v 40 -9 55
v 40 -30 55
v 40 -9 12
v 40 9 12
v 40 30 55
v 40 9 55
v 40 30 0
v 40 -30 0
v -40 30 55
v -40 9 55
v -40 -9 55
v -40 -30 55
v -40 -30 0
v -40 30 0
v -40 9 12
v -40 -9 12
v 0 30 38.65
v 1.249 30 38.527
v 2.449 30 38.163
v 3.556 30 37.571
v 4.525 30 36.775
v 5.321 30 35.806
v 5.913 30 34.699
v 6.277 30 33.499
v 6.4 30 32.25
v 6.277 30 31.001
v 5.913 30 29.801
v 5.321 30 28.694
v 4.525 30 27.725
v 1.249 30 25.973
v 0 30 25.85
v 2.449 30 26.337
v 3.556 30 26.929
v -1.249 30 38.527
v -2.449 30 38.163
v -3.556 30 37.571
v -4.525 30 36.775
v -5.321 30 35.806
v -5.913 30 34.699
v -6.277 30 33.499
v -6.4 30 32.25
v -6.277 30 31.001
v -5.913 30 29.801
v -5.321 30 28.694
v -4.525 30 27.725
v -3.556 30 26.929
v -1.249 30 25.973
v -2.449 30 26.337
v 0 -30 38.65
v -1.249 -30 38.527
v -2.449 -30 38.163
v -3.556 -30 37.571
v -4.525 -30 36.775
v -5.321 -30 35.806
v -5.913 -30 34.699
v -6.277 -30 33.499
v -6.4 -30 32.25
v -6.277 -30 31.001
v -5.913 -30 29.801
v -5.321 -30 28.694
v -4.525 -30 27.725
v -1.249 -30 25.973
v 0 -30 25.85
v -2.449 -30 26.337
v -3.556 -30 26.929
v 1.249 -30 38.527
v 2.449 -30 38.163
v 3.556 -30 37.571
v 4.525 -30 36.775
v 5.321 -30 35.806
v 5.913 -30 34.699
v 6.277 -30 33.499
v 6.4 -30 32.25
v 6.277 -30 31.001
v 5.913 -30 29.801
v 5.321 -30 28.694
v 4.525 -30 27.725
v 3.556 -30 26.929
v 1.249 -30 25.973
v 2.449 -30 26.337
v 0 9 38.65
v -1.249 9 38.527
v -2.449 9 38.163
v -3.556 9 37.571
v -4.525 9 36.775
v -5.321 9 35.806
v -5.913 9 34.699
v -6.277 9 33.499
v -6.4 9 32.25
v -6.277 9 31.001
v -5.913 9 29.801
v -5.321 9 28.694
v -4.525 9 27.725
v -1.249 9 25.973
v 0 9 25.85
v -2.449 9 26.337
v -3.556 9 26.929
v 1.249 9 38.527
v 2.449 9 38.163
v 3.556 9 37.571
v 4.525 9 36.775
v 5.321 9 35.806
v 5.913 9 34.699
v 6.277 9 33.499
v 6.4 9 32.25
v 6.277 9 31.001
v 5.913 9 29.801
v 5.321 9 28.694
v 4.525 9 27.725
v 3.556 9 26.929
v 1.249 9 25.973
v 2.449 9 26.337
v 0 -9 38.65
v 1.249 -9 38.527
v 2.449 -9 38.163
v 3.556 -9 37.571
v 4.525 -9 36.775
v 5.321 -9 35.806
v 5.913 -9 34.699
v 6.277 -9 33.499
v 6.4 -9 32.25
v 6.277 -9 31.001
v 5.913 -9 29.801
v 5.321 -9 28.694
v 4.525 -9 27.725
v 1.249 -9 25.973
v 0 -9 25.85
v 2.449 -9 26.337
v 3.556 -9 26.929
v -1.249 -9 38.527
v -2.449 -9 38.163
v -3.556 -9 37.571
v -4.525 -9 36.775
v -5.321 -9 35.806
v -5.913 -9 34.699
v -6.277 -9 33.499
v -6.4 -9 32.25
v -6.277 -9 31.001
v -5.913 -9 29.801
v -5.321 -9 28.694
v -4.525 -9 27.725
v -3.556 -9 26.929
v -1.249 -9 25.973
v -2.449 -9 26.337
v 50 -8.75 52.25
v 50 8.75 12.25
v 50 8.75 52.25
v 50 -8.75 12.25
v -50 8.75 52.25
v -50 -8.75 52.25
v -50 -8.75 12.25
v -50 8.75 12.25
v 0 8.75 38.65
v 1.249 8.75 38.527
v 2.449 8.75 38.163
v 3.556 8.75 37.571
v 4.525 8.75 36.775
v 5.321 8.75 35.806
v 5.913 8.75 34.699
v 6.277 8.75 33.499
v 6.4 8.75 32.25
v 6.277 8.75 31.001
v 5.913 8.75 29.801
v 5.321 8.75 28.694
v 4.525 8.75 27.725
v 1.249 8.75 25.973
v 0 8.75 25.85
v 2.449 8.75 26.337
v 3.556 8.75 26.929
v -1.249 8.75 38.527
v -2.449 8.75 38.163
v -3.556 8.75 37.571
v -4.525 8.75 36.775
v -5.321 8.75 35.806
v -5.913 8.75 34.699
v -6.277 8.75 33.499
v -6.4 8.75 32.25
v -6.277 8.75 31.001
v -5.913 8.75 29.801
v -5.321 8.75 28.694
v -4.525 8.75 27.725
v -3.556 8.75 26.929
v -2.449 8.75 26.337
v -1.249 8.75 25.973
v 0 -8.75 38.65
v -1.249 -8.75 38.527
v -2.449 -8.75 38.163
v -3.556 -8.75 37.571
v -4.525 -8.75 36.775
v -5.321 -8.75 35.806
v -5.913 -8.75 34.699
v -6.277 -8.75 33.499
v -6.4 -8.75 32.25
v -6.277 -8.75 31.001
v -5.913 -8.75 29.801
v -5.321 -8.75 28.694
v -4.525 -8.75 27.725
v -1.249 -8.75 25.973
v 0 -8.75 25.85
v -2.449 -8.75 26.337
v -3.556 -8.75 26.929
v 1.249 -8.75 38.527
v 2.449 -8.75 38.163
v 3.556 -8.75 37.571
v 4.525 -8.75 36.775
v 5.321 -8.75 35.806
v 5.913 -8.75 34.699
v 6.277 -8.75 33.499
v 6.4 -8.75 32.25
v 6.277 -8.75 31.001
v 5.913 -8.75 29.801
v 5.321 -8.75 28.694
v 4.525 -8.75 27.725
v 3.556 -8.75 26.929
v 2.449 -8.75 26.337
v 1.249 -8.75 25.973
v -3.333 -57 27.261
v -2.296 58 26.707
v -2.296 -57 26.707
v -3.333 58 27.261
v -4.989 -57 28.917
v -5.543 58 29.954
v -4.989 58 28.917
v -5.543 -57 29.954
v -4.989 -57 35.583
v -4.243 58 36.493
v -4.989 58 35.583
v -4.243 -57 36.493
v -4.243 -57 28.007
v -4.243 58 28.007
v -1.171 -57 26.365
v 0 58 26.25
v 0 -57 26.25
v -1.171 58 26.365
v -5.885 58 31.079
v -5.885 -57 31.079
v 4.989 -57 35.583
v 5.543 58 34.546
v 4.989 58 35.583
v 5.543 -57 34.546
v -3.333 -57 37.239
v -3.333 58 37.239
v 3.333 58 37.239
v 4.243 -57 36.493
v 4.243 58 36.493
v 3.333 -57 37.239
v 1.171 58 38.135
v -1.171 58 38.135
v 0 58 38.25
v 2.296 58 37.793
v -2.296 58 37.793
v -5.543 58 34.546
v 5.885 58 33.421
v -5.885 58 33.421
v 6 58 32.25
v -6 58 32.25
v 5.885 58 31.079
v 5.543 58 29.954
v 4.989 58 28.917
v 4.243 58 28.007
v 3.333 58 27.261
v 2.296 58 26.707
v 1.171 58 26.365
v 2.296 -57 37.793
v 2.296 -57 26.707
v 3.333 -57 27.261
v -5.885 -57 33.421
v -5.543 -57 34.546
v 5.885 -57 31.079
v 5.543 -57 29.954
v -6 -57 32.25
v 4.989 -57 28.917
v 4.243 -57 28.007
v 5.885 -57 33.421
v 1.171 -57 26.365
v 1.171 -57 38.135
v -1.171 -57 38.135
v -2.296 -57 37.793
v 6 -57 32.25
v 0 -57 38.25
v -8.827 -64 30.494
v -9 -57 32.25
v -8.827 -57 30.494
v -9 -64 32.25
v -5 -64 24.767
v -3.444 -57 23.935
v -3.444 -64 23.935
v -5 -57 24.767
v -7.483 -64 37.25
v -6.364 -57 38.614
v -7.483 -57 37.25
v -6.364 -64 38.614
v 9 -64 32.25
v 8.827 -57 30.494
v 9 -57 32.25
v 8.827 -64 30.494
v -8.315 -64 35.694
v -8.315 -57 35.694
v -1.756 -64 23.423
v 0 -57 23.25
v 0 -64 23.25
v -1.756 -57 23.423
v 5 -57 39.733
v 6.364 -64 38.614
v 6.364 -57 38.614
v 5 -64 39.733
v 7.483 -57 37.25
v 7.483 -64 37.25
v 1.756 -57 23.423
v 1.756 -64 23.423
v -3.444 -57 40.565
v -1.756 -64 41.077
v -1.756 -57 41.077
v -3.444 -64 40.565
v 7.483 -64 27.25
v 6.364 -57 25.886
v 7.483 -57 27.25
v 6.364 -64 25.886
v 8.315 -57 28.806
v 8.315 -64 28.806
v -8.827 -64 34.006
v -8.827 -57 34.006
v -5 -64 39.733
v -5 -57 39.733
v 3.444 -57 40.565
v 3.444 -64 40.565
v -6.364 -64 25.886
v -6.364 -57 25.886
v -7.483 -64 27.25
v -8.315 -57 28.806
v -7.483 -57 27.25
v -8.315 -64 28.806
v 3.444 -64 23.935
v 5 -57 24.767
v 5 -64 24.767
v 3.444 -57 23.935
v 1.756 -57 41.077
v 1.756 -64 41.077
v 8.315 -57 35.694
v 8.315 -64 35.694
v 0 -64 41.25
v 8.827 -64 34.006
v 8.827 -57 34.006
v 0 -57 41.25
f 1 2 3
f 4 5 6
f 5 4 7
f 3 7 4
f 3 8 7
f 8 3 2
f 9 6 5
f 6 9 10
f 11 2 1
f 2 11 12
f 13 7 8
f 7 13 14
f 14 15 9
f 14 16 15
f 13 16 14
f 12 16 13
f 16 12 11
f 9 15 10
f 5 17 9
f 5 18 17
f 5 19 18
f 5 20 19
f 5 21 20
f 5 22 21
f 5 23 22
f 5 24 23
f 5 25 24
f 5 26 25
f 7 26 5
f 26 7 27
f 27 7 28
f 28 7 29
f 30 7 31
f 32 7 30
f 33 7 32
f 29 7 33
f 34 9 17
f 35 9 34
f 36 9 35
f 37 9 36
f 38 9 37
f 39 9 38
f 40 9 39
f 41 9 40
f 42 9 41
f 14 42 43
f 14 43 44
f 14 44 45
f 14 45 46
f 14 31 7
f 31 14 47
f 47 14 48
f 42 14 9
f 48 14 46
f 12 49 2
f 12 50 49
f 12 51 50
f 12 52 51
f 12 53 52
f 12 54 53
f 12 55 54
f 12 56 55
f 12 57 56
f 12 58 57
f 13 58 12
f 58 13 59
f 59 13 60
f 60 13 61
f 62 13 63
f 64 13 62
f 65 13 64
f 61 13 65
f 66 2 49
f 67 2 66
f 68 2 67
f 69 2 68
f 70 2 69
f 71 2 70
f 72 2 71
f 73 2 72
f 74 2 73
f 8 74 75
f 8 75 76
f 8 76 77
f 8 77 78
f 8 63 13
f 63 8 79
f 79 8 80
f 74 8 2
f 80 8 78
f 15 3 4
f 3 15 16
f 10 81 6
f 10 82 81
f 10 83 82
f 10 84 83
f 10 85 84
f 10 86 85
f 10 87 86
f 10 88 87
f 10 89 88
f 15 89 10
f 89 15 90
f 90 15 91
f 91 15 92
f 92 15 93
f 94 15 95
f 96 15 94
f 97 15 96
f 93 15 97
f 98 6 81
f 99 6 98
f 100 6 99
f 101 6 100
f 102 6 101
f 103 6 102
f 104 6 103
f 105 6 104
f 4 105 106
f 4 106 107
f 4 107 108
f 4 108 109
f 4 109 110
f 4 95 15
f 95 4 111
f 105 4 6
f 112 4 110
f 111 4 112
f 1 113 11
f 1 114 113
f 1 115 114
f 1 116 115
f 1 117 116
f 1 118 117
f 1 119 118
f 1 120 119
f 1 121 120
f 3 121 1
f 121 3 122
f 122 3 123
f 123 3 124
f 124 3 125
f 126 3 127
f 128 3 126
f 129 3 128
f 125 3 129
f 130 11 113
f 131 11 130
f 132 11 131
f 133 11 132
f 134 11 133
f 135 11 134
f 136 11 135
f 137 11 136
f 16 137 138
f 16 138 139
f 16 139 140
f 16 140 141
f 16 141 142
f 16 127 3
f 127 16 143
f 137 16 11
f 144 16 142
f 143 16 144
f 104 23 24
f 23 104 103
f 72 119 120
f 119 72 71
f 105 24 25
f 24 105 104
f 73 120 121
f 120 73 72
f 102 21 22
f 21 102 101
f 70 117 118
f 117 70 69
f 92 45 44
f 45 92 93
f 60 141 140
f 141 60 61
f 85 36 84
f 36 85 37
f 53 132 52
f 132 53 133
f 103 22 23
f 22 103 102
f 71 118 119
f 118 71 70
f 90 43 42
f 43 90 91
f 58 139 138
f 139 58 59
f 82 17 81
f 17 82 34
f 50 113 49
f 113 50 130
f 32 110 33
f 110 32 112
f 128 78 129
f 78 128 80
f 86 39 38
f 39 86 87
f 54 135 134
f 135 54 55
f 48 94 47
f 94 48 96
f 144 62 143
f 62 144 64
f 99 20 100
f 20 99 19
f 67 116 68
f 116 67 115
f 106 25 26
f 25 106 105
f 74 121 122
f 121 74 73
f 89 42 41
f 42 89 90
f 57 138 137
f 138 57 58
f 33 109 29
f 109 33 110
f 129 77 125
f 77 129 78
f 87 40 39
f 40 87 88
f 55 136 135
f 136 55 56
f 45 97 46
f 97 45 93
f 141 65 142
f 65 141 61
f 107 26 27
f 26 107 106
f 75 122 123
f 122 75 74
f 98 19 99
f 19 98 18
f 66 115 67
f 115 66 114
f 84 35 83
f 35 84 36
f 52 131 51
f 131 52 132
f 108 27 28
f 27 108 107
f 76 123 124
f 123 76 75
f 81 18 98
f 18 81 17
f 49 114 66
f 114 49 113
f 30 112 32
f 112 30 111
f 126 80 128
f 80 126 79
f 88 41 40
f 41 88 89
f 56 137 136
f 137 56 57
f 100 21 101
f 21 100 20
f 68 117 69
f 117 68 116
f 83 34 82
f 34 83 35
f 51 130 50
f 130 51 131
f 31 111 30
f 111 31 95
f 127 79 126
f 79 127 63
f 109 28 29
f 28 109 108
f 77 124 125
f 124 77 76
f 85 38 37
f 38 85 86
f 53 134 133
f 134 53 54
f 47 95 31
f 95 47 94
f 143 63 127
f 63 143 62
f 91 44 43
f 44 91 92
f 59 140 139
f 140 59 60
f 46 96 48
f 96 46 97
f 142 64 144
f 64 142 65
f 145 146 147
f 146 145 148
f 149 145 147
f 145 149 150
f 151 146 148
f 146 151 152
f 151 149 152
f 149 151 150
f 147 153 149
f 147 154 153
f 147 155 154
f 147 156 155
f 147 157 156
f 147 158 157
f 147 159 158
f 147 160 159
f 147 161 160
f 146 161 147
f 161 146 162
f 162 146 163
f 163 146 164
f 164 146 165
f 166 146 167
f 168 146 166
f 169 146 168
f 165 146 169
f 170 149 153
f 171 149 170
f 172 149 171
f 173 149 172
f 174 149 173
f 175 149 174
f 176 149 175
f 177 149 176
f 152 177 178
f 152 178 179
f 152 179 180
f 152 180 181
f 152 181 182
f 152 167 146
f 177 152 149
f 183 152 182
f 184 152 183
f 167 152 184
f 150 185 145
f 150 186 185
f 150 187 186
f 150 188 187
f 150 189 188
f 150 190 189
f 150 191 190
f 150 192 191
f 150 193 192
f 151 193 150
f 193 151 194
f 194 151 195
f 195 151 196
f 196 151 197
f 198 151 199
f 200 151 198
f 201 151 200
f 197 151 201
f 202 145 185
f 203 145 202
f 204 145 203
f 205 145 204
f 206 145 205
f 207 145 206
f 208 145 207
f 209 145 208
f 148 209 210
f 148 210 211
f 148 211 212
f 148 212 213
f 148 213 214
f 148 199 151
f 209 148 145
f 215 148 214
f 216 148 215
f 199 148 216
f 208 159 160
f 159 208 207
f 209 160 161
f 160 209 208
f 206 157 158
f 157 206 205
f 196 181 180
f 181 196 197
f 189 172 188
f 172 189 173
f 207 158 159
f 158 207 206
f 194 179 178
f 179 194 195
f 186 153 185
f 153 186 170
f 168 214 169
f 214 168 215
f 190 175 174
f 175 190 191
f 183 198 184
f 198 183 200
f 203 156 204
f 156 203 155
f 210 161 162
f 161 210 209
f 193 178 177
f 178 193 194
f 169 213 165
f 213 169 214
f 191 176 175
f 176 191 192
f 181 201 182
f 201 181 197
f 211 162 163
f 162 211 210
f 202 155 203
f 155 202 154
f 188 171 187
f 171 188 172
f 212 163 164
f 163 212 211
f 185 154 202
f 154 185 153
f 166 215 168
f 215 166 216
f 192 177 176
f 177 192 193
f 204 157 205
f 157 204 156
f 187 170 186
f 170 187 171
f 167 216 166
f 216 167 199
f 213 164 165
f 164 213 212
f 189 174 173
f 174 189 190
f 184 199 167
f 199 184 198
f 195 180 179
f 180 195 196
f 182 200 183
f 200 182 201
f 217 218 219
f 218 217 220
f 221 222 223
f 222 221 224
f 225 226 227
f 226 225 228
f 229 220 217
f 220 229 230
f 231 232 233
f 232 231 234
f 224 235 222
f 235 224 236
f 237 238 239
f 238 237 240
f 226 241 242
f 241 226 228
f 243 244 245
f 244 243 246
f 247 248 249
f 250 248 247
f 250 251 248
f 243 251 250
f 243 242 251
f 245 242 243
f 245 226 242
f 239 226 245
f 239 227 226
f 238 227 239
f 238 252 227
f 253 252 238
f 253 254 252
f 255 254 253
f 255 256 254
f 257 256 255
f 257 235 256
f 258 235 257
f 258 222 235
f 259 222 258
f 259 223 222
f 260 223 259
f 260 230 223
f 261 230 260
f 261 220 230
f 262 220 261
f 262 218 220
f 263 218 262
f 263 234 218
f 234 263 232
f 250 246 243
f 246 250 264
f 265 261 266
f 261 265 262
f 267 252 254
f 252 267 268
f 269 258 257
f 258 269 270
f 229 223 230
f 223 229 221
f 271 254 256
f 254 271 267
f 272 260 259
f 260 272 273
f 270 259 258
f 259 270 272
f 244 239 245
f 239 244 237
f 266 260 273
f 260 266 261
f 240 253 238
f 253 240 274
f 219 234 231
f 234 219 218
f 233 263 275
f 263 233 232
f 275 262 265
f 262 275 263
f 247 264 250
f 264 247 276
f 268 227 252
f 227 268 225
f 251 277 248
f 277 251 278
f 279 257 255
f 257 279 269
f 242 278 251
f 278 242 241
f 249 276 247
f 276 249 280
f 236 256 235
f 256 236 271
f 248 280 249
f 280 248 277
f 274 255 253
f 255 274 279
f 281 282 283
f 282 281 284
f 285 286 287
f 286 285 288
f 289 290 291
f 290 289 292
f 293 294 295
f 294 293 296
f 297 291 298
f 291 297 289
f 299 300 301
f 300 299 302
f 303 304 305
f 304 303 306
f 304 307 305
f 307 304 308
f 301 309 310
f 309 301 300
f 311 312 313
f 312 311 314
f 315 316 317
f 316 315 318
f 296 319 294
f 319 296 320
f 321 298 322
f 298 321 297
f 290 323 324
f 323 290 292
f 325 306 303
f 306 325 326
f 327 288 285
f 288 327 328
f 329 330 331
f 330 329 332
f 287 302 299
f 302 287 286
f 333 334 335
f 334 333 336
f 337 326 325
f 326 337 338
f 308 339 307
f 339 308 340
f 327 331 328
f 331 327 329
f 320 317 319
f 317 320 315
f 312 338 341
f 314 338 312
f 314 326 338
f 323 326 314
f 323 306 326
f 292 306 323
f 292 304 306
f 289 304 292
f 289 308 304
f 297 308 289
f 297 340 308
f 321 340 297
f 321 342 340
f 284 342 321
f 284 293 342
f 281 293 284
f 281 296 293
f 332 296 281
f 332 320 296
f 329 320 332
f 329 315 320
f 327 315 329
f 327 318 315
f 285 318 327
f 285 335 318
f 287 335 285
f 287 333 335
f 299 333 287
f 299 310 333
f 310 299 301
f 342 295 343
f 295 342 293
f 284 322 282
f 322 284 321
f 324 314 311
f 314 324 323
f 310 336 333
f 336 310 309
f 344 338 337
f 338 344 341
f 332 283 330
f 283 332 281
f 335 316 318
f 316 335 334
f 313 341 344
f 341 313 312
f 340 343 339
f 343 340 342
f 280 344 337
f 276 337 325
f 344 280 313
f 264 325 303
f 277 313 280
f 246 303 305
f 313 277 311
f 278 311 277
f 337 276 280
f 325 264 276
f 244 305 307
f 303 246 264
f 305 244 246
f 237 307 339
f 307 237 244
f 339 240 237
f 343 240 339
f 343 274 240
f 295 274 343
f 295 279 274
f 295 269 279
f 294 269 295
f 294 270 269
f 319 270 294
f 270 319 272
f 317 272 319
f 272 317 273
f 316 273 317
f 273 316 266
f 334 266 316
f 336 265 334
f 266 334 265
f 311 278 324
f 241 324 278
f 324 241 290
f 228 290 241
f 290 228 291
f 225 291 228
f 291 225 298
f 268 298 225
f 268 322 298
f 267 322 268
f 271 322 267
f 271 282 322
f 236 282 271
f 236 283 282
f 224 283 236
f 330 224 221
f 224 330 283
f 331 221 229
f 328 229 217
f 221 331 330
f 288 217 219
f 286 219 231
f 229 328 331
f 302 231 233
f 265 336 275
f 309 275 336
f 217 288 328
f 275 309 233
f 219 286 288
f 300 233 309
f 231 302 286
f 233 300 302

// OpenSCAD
$fn = 32;

// ------------------------------------------------------------------------
// Clevis joint: 80 mm clevis, pin d12
// Every part is its own module, assembly() places them once.
// ------------------------------------------------------------------------

// --- part 1 ---
module clevis() {
  difference() {
    translate([-40, -30, 0]) cube([80, 60, 55]);
    translate([-41, -9, 12]) cube([82, 18, 44]);
    translate([0, 0, 32.25]) rotate([90, 0, 0]) cylinder(h = 62, d = 12.8, center = true);
  }
}

// --- part 2 ---
module eye() {
  difference() {
    translate([-50, -8.75, 0]) cube([100, 17.5, 40]);
    translate([0, 0, 20]) rotate([90, 0, 0]) cylinder(h = 19.5, d = 12.8, center = true);
  }
}

// --- part 3 ---
module pin() {
  rotate([0, 90, 0]) cylinder(h = 116, d = 12, center = true);
  translate([-64, 0, 0]) rotate([0, 90, 0]) cylinder(h = 7, d = 18);
}

// --- assembly ---
module assembly() {
  translate([0, 0, 0]) rotate([0, 0, 0]) clevis();
  translate([0, 0, 12.25]) rotate([0, 0, 0]) eye();
  translate([0, 0, 32.25]) rotate([0, 0, 90]) pin();
}

assembly();
